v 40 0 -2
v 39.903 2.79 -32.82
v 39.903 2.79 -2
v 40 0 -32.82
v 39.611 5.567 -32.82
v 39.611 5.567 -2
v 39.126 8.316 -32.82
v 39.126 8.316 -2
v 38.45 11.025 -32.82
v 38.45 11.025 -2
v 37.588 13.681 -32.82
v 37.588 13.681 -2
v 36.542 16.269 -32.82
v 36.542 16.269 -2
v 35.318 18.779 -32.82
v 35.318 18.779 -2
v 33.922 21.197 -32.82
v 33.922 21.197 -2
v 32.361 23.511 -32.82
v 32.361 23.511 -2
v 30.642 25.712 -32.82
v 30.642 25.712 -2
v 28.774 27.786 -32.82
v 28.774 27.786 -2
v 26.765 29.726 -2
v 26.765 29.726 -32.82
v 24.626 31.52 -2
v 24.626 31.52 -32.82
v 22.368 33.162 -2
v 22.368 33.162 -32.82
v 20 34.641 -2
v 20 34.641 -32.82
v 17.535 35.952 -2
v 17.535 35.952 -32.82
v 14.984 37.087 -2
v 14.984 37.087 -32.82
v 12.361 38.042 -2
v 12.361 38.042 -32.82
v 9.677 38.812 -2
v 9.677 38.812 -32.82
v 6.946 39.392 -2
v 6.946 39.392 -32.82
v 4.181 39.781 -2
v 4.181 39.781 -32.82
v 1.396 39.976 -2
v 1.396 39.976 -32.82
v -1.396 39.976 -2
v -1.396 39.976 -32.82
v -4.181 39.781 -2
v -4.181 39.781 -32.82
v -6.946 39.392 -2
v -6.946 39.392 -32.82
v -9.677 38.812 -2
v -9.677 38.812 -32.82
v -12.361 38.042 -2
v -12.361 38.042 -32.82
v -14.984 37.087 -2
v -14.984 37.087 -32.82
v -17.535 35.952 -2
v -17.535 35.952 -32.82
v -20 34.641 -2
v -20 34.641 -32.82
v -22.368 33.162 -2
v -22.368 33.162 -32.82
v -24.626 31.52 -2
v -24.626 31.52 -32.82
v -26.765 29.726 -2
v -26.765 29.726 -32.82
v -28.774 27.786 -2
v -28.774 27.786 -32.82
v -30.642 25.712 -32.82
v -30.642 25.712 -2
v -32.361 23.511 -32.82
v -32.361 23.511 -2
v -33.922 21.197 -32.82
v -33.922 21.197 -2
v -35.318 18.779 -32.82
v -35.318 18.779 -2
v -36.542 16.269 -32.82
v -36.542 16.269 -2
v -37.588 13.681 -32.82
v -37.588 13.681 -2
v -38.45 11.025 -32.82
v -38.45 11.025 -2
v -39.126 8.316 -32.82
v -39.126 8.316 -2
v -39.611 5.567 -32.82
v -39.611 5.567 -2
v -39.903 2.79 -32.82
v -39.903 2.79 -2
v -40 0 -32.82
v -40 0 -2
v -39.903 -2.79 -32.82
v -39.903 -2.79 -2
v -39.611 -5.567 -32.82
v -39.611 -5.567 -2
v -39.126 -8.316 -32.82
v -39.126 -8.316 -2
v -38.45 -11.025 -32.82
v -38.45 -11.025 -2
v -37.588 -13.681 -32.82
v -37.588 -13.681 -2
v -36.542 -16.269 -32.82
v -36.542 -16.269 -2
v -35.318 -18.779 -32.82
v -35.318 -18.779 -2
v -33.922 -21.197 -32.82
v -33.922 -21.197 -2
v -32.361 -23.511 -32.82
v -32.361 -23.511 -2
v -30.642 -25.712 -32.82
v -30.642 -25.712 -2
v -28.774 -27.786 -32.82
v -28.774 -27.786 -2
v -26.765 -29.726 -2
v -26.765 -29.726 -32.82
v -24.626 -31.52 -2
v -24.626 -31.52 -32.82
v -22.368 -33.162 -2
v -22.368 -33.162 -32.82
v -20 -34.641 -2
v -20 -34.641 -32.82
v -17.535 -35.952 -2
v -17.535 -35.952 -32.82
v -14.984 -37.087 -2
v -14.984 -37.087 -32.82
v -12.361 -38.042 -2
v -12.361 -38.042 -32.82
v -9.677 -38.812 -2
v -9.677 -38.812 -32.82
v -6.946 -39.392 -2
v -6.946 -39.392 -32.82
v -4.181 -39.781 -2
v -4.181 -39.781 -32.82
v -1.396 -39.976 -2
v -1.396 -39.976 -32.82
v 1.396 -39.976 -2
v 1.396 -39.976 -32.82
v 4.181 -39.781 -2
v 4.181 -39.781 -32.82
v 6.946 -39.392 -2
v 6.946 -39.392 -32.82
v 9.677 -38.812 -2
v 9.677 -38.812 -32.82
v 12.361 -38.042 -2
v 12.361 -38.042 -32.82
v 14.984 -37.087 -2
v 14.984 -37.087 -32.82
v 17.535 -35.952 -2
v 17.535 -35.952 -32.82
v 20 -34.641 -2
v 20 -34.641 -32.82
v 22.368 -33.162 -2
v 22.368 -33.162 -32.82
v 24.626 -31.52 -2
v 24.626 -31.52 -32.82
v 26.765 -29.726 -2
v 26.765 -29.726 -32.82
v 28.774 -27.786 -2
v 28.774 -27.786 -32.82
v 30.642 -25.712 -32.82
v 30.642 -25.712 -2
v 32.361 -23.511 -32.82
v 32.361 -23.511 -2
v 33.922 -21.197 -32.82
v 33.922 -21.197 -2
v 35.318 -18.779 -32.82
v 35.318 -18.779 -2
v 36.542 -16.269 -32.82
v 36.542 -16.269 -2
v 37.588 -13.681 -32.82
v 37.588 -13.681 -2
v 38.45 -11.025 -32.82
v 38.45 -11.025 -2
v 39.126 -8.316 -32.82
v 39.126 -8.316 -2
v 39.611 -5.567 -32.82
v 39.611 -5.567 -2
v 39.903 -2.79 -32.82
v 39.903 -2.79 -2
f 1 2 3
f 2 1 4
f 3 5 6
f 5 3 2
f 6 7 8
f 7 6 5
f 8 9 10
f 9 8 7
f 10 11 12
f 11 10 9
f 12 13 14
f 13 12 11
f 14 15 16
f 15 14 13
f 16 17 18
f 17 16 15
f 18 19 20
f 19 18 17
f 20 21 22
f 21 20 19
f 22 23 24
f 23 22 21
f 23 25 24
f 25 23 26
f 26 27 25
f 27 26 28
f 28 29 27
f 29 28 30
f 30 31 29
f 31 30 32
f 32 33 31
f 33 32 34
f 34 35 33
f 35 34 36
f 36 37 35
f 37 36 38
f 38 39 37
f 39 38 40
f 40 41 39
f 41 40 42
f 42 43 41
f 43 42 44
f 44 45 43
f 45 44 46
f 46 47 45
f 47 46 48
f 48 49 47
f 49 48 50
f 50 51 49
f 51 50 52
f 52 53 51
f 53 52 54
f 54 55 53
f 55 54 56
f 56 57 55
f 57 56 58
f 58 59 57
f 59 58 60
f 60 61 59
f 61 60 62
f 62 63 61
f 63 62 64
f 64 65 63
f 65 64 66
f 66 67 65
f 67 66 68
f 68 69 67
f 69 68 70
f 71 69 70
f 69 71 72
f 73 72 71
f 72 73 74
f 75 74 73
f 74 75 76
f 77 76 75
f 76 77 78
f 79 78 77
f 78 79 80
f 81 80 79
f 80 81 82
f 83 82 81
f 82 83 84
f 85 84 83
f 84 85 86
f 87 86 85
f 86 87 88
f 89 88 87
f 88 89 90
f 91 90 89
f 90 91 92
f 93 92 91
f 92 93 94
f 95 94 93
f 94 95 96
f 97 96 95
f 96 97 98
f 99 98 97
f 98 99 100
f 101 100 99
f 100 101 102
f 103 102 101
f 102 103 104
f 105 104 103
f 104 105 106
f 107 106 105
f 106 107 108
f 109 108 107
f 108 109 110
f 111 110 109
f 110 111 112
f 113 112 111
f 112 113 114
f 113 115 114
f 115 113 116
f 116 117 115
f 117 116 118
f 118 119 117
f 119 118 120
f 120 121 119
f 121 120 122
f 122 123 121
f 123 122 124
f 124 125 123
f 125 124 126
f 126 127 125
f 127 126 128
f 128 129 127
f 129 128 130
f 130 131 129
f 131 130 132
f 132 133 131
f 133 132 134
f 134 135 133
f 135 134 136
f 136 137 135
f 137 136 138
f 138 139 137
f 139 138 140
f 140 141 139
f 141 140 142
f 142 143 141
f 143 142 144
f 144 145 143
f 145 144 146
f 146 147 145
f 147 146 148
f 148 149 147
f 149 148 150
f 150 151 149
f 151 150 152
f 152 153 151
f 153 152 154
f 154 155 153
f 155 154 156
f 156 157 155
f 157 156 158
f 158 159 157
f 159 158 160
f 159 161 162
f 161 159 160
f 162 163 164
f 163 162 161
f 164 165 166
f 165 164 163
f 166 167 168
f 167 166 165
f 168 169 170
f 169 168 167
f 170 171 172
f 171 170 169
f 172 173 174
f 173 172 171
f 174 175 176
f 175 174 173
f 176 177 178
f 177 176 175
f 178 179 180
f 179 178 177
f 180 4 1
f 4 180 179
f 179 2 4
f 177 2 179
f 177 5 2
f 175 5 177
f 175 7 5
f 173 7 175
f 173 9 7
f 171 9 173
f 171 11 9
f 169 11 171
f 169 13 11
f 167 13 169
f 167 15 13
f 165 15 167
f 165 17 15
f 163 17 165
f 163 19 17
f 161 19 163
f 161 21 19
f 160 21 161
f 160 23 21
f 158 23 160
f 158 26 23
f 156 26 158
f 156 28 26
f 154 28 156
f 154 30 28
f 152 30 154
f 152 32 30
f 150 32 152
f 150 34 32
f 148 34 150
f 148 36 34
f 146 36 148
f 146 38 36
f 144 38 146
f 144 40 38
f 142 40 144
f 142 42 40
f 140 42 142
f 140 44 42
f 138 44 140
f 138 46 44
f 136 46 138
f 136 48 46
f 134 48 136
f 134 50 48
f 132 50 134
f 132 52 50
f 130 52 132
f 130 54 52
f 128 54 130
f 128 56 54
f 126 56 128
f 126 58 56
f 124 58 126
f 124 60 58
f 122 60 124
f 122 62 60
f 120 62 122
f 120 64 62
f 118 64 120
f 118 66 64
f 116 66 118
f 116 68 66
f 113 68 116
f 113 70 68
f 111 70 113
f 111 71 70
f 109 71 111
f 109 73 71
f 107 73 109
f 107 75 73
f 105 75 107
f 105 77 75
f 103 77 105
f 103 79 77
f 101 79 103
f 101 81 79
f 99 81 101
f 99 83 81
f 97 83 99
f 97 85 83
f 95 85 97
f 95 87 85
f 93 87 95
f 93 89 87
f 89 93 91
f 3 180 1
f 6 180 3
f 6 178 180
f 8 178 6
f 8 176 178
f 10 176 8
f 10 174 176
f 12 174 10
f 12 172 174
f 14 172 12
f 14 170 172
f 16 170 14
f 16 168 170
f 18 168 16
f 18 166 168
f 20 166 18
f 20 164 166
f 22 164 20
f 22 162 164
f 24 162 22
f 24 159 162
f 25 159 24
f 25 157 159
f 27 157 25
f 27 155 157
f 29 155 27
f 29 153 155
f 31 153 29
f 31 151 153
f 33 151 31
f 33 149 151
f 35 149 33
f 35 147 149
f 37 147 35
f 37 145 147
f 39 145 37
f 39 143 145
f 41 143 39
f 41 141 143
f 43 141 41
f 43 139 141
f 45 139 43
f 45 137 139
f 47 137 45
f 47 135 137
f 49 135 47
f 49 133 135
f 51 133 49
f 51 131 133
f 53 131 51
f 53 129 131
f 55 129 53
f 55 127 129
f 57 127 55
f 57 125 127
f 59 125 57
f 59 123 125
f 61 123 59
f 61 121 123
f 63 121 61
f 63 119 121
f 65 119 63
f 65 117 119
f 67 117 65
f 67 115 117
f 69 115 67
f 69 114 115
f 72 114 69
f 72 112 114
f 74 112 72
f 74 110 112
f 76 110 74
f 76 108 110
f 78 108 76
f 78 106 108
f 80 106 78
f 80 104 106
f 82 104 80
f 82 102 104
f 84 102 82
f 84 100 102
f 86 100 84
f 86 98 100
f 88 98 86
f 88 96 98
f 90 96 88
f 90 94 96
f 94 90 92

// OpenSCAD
ORIGINAL_EXTRA_BOTTOM = 2;
NEW_EXTRA_BOTTOM = 27.92 - 3;


// and we also need to account for the mount thickness which is 7.9mm
DIFF_NEEDED = NEW_EXTRA_BOTTOM - ORIGINAL_EXTRA_BOTTOM + 7.9;

echo("total diff:");
echo(DIFF_NEEDED);


$fn = 90;

// make a cylinder that is DIFF_NEEDED tall and 80mm diameter

translate([0, 0, -NEW_EXTRA_BOTTOM - 7.9])
  cylinder(h=DIFF_NEEDED, r=80/2);
